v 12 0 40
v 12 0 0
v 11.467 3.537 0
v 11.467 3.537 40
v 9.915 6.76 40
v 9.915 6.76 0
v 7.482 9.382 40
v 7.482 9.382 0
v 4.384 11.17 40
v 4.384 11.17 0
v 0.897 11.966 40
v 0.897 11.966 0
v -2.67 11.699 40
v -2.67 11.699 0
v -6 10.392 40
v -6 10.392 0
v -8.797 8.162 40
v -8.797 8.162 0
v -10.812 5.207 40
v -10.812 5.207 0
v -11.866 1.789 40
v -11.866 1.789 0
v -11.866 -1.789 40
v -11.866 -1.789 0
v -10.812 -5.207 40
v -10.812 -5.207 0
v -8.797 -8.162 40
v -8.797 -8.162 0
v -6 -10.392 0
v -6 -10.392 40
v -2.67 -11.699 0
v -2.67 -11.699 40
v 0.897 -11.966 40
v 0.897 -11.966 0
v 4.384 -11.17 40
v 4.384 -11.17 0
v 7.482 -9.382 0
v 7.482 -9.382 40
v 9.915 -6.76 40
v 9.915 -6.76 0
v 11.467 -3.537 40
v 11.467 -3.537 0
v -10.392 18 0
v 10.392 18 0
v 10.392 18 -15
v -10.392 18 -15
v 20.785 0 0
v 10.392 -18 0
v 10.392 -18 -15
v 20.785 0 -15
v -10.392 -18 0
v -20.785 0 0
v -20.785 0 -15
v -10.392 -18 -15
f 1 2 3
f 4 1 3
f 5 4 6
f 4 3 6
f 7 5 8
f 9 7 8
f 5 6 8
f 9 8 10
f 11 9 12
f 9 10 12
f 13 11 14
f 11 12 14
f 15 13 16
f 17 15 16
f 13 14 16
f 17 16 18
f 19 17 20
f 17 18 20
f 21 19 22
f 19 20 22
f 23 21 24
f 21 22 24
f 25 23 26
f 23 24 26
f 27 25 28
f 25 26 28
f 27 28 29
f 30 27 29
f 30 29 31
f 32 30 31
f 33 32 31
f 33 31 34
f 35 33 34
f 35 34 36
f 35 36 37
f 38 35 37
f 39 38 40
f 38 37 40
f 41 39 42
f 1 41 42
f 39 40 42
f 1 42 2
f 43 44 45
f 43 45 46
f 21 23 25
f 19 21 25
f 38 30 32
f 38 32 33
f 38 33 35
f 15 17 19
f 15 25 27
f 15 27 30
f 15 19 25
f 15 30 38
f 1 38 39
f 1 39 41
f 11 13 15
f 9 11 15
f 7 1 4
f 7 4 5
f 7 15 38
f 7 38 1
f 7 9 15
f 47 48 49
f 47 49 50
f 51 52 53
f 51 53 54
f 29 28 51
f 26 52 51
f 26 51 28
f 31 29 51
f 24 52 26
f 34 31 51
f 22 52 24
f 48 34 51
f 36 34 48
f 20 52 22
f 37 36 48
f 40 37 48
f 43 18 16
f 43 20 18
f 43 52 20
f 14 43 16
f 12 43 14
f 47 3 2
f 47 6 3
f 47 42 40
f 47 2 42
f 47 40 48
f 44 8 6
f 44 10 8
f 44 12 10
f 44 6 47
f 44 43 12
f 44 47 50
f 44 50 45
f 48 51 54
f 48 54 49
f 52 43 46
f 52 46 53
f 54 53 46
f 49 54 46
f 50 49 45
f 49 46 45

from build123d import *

# Parameters (mm, degrees)
F0_R     = 12
F1_DEPTH = 40
F3_DEPTH = 15


with BuildPart() as f1:
    # F0 (on Top) → F1 (new body)
    with BuildSketch(Plane.XY):
        Circle(F0_R)
    extrude(amount=F1_DEPTH)

    # F2 (on Top) → F3 (join)
    with BuildSketch(Plane.XY):
        Polygon((20.78461, 0), (10.392305, 18), (-10.392305, 18), (-20.78461, 0), (-10.392305, -18), (10.392305, -18), align=None)
    extrude(amount=-F3_DEPTH)


solid = f1.part
